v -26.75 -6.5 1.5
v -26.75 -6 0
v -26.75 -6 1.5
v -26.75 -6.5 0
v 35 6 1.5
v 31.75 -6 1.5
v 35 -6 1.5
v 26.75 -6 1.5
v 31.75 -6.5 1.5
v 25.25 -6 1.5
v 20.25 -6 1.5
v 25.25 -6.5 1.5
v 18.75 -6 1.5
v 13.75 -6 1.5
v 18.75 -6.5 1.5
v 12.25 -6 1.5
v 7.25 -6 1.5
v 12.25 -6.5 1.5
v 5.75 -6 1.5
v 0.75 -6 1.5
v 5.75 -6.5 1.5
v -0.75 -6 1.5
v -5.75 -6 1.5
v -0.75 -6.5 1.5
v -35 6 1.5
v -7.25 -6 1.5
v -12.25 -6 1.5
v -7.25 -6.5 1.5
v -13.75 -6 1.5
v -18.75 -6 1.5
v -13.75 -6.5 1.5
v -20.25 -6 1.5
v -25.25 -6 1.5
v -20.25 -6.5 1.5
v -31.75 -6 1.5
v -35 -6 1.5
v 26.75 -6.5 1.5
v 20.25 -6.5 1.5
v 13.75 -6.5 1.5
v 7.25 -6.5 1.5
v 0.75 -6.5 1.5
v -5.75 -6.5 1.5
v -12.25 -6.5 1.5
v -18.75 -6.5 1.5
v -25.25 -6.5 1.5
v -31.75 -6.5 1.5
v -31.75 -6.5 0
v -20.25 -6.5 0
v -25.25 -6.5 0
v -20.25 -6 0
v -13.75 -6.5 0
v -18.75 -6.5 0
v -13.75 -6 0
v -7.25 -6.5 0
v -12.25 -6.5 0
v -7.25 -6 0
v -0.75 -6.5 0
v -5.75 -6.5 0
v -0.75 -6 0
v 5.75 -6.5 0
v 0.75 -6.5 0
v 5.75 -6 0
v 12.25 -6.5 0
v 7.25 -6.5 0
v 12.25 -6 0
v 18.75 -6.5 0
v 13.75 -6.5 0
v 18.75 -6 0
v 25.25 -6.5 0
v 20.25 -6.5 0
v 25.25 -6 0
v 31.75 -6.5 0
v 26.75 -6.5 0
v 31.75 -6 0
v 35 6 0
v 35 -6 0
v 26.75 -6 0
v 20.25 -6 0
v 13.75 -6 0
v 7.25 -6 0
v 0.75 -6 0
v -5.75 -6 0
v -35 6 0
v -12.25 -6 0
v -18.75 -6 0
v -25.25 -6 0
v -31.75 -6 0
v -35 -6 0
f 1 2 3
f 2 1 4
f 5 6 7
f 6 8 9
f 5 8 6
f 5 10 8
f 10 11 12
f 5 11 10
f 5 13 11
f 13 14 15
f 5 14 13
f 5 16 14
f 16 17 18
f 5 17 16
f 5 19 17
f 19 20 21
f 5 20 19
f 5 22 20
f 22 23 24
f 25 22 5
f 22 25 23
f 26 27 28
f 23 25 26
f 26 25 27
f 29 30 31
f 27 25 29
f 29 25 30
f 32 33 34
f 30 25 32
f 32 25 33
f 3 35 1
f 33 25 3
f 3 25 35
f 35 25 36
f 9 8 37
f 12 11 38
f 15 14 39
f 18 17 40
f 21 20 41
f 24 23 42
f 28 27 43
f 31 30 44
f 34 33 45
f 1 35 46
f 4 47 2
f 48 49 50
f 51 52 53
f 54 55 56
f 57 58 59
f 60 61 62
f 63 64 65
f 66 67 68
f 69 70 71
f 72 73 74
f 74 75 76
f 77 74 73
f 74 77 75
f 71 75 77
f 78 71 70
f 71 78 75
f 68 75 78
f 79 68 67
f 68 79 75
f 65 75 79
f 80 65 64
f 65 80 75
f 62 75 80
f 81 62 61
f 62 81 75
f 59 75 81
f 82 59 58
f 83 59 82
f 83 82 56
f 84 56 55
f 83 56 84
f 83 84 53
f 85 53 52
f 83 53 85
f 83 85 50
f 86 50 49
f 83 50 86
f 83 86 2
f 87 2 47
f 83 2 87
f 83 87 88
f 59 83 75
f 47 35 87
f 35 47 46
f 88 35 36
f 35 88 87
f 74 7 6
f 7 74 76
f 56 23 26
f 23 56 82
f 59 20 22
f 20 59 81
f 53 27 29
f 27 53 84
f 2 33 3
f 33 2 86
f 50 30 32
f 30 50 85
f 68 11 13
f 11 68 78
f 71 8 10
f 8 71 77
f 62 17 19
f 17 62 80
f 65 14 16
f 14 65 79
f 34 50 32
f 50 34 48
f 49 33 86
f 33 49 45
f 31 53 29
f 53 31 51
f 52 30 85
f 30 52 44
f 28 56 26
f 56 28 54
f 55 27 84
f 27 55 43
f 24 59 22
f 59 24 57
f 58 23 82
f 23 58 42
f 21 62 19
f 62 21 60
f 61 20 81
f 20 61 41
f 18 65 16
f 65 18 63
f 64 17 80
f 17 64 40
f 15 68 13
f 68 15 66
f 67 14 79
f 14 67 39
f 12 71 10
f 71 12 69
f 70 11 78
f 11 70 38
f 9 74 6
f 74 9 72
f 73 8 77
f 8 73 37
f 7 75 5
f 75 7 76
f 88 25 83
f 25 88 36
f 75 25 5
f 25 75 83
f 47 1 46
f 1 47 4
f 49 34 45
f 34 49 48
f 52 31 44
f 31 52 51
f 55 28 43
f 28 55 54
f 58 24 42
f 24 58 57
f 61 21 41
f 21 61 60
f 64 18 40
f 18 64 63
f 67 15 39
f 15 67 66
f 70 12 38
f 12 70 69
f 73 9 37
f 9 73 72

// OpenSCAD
// 10-well agarose gel comb - printed lying flat
// Units: mm

plate_t      = 1.5;   // plate thickness (Z)
spine_len    = 70;    // spine length (X)
spine_w      = 12;    // spine width (Y)
tooth_count  = 10;    // number of teeth
tooth_w      = 5.0;   // tooth width (X)
tooth_len    = 12;    // tooth length (Y)
gap          = 1.5;   // gap between teeth (X)
eps          = 0.5;   // cutter overshoot

$fn = 64;

pitch = tooth_w + gap;
x0    = -(tooth_count - 1) * pitch / 2;    // first tooth centre

difference() {
    union() {
        // spine
        translate([-spine_len / 2, -spine_w / 2, 0])
            cube([spine_len, spine_w, plate_t]);
        // teeth
        for (i = [0 : tooth_count - 1])
            translate([x0 + i * pitch - tooth_w / 2, -spine_w / 2 - tooth_len, 0])
                cube([tooth_w, tooth_len, plate_t]);
    }
    // wells
    for (i = [0 : tooth_count - 1])
        translate([x0 + i * pitch - tooth_w / 2, -spine_w / 2 - tooth_len - eps, -eps])
            cube([tooth_w, tooth_len, plate_t + 2 * eps]);
}
